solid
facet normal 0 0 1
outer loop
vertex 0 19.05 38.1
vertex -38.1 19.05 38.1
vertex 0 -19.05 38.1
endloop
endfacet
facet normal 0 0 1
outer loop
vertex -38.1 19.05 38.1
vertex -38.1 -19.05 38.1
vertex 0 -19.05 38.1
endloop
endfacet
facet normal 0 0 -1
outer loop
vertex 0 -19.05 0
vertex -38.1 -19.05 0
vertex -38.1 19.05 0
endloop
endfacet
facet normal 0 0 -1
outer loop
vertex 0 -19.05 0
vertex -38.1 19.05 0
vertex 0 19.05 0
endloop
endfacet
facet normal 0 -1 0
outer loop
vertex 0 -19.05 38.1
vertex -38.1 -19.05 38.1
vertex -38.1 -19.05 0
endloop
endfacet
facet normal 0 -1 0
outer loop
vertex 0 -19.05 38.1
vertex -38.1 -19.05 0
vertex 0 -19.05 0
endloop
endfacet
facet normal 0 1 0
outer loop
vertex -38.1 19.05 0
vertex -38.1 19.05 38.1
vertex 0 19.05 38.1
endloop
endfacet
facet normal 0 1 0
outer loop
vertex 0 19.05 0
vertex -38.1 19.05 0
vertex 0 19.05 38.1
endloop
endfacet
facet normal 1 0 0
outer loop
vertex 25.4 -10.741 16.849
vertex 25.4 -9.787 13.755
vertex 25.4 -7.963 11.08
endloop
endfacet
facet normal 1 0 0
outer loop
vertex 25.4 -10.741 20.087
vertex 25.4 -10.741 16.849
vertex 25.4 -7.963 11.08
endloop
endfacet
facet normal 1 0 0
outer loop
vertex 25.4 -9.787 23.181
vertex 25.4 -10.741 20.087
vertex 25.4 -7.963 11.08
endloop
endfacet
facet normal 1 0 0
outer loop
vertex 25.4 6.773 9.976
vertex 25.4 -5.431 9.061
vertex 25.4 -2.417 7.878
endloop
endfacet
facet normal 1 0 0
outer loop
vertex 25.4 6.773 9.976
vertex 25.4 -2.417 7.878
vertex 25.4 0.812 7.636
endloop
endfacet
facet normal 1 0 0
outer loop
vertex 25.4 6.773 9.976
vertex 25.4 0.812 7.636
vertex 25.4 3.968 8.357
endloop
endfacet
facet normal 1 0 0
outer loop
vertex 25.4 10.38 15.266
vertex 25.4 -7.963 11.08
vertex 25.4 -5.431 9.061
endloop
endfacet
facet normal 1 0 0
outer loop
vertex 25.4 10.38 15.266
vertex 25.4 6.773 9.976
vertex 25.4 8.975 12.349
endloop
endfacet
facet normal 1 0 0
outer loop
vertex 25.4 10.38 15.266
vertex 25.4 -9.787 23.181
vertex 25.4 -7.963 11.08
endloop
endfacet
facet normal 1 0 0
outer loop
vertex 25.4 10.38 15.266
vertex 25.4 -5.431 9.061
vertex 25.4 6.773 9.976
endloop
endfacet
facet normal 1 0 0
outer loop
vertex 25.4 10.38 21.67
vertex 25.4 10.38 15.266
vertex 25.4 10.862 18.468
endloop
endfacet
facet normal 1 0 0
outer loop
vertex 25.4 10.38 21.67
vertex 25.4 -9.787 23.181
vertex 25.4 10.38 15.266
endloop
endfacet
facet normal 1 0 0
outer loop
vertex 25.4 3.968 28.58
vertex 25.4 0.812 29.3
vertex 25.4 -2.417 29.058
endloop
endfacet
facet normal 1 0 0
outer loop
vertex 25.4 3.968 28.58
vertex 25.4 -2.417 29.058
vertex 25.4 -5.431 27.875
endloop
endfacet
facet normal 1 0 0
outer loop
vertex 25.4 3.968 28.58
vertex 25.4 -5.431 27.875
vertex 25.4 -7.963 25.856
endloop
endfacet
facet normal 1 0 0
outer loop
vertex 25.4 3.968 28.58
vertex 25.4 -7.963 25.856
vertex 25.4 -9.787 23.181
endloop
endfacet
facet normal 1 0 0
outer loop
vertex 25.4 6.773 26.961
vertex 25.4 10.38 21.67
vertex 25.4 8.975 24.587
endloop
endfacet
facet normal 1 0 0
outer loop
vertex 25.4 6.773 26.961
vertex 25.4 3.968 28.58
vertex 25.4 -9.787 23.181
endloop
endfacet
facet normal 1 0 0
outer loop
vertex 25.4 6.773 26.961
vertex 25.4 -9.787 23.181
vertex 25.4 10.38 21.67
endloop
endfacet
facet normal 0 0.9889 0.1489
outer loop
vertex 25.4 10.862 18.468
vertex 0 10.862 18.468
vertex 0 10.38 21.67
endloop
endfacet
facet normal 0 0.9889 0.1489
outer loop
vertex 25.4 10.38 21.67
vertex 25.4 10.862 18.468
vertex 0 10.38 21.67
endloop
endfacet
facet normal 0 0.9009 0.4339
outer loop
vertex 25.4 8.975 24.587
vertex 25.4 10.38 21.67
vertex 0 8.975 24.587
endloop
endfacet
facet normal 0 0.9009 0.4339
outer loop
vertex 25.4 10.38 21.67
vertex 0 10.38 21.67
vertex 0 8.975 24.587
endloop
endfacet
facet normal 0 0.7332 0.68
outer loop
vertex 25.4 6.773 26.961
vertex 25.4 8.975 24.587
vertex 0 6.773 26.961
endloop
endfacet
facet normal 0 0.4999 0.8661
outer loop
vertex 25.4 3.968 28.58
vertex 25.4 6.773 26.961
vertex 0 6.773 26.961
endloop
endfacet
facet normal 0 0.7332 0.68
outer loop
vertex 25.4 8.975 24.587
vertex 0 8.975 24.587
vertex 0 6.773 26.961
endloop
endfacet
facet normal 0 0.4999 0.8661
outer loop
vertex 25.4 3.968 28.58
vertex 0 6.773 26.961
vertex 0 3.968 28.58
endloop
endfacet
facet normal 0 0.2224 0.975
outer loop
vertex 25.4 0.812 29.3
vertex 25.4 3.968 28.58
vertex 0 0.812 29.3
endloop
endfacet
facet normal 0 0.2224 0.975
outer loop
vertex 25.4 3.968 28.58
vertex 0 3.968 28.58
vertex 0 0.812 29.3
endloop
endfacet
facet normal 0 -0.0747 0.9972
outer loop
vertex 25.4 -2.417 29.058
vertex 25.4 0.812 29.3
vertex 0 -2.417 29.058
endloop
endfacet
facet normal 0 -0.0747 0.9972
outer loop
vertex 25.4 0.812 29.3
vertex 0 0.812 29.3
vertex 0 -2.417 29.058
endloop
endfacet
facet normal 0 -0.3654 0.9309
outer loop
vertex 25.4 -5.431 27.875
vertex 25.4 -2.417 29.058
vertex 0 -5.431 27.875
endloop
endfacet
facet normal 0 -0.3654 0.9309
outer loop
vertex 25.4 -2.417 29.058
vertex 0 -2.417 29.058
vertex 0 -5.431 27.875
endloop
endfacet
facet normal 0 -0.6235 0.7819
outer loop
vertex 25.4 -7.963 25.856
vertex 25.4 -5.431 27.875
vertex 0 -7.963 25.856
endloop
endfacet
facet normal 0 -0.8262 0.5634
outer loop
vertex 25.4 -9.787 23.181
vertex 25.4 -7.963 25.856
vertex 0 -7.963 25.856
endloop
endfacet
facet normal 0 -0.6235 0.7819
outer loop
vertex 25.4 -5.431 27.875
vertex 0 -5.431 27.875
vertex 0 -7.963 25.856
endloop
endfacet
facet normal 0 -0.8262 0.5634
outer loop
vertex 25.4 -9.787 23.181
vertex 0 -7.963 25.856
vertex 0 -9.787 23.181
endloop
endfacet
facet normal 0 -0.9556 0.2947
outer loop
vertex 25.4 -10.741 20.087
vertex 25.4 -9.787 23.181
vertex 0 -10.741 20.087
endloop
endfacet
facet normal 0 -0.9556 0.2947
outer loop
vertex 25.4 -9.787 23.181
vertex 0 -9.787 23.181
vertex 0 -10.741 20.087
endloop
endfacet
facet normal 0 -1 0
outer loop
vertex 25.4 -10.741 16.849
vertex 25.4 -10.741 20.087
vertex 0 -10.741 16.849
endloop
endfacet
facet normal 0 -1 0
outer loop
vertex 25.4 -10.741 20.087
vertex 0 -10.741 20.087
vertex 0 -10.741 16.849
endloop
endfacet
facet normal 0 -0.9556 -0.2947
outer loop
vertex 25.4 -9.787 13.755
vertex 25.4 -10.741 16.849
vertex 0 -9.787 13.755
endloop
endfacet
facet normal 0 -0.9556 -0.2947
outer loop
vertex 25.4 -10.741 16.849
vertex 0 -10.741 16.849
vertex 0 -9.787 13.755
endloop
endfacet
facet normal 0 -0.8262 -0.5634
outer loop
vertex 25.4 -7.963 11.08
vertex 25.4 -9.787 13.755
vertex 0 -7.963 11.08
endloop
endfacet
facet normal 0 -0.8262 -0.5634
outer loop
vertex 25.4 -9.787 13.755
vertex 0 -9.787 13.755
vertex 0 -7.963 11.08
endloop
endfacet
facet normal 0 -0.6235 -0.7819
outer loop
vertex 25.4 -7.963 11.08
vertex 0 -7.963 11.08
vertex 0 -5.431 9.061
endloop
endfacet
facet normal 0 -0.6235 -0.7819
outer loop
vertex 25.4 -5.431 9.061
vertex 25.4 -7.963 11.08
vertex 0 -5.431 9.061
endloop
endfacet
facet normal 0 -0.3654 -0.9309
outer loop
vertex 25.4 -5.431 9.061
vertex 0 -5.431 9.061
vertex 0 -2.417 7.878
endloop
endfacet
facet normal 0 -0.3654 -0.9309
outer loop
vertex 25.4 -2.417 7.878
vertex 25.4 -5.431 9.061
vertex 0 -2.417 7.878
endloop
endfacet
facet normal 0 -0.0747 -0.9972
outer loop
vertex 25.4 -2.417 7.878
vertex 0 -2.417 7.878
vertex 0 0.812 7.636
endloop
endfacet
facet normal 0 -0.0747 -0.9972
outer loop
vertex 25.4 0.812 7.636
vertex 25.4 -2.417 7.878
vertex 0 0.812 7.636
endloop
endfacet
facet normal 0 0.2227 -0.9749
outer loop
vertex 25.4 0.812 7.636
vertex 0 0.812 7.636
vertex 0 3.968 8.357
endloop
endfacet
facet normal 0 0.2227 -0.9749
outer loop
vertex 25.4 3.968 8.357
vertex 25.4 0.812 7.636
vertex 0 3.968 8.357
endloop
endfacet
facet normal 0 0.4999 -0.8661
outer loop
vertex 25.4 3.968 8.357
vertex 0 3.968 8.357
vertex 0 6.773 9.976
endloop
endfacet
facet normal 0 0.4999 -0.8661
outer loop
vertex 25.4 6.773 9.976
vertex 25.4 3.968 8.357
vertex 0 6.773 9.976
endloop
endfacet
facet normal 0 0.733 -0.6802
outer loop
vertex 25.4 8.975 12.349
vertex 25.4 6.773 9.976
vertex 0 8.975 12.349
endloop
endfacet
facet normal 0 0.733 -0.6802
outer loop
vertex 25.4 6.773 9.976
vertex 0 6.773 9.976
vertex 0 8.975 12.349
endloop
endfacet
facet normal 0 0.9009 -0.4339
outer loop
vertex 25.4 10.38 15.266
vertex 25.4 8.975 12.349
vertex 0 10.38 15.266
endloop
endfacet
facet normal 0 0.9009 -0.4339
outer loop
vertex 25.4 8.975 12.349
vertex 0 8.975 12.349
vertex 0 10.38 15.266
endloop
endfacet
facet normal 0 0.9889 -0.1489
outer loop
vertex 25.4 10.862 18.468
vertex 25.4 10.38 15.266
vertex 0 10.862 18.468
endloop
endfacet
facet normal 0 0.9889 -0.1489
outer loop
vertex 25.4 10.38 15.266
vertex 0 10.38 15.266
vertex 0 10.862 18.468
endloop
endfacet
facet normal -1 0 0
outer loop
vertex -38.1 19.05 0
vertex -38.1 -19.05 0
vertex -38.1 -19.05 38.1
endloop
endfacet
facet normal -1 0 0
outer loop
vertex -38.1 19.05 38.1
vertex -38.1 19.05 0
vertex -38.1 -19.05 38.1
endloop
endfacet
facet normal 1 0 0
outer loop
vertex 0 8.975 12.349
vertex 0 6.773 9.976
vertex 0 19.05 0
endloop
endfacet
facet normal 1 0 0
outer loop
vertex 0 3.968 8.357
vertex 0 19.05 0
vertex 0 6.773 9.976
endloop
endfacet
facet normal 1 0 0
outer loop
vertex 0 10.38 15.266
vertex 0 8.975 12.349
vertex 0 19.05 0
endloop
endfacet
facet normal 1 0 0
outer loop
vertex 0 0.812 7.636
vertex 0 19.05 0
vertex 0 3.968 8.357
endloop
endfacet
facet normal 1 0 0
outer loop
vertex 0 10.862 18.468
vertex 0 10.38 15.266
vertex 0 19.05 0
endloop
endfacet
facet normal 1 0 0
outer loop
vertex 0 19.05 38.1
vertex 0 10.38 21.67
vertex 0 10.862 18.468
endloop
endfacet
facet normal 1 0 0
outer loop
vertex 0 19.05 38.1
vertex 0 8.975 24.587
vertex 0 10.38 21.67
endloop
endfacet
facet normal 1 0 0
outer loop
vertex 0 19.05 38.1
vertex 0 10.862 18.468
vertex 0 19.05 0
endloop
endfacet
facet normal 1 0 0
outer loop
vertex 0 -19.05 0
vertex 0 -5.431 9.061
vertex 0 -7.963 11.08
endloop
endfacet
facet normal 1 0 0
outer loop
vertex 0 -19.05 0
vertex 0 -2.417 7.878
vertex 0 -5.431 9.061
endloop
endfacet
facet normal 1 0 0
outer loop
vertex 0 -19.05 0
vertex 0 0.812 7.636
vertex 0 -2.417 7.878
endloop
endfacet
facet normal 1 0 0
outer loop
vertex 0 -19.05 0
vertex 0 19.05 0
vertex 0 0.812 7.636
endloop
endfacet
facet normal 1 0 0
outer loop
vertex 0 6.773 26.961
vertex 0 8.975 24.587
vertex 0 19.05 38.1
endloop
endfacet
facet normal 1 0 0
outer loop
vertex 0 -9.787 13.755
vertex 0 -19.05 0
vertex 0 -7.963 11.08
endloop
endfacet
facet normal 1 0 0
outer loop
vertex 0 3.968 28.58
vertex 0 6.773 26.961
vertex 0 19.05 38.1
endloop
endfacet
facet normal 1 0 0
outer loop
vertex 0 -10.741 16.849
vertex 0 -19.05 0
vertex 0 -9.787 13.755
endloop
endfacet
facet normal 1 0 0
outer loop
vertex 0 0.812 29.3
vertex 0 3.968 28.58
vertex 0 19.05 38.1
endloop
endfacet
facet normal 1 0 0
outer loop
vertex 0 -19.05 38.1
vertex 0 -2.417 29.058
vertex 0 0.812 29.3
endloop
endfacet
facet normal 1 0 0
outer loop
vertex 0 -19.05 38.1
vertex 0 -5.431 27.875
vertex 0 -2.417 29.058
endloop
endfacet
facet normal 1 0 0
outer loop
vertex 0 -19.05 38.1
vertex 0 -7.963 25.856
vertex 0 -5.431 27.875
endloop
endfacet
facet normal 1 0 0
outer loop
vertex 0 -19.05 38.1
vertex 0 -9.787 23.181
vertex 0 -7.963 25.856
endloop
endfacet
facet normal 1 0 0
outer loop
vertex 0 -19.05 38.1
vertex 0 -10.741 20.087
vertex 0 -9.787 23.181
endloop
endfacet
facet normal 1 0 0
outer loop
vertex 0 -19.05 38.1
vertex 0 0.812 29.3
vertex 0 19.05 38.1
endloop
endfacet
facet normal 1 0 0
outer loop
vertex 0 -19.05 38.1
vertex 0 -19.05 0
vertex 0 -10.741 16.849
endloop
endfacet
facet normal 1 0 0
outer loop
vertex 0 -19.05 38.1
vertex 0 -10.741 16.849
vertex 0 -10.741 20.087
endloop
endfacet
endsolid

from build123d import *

# Parameters (mm, degrees)
F0_W     = 38.1
F0_H     = 38.1
F1_DEPTH = 19.05
F2_R     = 10.862453
F3_DEPTH = 25.4


with BuildPart() as f1:
    # F0 (on Front) → F1 (new body, symmetric)
    with BuildSketch(Plane.XZ):
        with Locations((-19.05, 19.05)):
            Rectangle(F0_W, F0_H)
    extrude(amount=F1_DEPTH, both=True)

    # F2 (on face) → F3 (join)
    with BuildSketch(Plane.YZ):
        with Locations((0, 18.468129)):
            Circle(F2_R)
    extrude(amount=F3_DEPTH)


solid = f1.part
